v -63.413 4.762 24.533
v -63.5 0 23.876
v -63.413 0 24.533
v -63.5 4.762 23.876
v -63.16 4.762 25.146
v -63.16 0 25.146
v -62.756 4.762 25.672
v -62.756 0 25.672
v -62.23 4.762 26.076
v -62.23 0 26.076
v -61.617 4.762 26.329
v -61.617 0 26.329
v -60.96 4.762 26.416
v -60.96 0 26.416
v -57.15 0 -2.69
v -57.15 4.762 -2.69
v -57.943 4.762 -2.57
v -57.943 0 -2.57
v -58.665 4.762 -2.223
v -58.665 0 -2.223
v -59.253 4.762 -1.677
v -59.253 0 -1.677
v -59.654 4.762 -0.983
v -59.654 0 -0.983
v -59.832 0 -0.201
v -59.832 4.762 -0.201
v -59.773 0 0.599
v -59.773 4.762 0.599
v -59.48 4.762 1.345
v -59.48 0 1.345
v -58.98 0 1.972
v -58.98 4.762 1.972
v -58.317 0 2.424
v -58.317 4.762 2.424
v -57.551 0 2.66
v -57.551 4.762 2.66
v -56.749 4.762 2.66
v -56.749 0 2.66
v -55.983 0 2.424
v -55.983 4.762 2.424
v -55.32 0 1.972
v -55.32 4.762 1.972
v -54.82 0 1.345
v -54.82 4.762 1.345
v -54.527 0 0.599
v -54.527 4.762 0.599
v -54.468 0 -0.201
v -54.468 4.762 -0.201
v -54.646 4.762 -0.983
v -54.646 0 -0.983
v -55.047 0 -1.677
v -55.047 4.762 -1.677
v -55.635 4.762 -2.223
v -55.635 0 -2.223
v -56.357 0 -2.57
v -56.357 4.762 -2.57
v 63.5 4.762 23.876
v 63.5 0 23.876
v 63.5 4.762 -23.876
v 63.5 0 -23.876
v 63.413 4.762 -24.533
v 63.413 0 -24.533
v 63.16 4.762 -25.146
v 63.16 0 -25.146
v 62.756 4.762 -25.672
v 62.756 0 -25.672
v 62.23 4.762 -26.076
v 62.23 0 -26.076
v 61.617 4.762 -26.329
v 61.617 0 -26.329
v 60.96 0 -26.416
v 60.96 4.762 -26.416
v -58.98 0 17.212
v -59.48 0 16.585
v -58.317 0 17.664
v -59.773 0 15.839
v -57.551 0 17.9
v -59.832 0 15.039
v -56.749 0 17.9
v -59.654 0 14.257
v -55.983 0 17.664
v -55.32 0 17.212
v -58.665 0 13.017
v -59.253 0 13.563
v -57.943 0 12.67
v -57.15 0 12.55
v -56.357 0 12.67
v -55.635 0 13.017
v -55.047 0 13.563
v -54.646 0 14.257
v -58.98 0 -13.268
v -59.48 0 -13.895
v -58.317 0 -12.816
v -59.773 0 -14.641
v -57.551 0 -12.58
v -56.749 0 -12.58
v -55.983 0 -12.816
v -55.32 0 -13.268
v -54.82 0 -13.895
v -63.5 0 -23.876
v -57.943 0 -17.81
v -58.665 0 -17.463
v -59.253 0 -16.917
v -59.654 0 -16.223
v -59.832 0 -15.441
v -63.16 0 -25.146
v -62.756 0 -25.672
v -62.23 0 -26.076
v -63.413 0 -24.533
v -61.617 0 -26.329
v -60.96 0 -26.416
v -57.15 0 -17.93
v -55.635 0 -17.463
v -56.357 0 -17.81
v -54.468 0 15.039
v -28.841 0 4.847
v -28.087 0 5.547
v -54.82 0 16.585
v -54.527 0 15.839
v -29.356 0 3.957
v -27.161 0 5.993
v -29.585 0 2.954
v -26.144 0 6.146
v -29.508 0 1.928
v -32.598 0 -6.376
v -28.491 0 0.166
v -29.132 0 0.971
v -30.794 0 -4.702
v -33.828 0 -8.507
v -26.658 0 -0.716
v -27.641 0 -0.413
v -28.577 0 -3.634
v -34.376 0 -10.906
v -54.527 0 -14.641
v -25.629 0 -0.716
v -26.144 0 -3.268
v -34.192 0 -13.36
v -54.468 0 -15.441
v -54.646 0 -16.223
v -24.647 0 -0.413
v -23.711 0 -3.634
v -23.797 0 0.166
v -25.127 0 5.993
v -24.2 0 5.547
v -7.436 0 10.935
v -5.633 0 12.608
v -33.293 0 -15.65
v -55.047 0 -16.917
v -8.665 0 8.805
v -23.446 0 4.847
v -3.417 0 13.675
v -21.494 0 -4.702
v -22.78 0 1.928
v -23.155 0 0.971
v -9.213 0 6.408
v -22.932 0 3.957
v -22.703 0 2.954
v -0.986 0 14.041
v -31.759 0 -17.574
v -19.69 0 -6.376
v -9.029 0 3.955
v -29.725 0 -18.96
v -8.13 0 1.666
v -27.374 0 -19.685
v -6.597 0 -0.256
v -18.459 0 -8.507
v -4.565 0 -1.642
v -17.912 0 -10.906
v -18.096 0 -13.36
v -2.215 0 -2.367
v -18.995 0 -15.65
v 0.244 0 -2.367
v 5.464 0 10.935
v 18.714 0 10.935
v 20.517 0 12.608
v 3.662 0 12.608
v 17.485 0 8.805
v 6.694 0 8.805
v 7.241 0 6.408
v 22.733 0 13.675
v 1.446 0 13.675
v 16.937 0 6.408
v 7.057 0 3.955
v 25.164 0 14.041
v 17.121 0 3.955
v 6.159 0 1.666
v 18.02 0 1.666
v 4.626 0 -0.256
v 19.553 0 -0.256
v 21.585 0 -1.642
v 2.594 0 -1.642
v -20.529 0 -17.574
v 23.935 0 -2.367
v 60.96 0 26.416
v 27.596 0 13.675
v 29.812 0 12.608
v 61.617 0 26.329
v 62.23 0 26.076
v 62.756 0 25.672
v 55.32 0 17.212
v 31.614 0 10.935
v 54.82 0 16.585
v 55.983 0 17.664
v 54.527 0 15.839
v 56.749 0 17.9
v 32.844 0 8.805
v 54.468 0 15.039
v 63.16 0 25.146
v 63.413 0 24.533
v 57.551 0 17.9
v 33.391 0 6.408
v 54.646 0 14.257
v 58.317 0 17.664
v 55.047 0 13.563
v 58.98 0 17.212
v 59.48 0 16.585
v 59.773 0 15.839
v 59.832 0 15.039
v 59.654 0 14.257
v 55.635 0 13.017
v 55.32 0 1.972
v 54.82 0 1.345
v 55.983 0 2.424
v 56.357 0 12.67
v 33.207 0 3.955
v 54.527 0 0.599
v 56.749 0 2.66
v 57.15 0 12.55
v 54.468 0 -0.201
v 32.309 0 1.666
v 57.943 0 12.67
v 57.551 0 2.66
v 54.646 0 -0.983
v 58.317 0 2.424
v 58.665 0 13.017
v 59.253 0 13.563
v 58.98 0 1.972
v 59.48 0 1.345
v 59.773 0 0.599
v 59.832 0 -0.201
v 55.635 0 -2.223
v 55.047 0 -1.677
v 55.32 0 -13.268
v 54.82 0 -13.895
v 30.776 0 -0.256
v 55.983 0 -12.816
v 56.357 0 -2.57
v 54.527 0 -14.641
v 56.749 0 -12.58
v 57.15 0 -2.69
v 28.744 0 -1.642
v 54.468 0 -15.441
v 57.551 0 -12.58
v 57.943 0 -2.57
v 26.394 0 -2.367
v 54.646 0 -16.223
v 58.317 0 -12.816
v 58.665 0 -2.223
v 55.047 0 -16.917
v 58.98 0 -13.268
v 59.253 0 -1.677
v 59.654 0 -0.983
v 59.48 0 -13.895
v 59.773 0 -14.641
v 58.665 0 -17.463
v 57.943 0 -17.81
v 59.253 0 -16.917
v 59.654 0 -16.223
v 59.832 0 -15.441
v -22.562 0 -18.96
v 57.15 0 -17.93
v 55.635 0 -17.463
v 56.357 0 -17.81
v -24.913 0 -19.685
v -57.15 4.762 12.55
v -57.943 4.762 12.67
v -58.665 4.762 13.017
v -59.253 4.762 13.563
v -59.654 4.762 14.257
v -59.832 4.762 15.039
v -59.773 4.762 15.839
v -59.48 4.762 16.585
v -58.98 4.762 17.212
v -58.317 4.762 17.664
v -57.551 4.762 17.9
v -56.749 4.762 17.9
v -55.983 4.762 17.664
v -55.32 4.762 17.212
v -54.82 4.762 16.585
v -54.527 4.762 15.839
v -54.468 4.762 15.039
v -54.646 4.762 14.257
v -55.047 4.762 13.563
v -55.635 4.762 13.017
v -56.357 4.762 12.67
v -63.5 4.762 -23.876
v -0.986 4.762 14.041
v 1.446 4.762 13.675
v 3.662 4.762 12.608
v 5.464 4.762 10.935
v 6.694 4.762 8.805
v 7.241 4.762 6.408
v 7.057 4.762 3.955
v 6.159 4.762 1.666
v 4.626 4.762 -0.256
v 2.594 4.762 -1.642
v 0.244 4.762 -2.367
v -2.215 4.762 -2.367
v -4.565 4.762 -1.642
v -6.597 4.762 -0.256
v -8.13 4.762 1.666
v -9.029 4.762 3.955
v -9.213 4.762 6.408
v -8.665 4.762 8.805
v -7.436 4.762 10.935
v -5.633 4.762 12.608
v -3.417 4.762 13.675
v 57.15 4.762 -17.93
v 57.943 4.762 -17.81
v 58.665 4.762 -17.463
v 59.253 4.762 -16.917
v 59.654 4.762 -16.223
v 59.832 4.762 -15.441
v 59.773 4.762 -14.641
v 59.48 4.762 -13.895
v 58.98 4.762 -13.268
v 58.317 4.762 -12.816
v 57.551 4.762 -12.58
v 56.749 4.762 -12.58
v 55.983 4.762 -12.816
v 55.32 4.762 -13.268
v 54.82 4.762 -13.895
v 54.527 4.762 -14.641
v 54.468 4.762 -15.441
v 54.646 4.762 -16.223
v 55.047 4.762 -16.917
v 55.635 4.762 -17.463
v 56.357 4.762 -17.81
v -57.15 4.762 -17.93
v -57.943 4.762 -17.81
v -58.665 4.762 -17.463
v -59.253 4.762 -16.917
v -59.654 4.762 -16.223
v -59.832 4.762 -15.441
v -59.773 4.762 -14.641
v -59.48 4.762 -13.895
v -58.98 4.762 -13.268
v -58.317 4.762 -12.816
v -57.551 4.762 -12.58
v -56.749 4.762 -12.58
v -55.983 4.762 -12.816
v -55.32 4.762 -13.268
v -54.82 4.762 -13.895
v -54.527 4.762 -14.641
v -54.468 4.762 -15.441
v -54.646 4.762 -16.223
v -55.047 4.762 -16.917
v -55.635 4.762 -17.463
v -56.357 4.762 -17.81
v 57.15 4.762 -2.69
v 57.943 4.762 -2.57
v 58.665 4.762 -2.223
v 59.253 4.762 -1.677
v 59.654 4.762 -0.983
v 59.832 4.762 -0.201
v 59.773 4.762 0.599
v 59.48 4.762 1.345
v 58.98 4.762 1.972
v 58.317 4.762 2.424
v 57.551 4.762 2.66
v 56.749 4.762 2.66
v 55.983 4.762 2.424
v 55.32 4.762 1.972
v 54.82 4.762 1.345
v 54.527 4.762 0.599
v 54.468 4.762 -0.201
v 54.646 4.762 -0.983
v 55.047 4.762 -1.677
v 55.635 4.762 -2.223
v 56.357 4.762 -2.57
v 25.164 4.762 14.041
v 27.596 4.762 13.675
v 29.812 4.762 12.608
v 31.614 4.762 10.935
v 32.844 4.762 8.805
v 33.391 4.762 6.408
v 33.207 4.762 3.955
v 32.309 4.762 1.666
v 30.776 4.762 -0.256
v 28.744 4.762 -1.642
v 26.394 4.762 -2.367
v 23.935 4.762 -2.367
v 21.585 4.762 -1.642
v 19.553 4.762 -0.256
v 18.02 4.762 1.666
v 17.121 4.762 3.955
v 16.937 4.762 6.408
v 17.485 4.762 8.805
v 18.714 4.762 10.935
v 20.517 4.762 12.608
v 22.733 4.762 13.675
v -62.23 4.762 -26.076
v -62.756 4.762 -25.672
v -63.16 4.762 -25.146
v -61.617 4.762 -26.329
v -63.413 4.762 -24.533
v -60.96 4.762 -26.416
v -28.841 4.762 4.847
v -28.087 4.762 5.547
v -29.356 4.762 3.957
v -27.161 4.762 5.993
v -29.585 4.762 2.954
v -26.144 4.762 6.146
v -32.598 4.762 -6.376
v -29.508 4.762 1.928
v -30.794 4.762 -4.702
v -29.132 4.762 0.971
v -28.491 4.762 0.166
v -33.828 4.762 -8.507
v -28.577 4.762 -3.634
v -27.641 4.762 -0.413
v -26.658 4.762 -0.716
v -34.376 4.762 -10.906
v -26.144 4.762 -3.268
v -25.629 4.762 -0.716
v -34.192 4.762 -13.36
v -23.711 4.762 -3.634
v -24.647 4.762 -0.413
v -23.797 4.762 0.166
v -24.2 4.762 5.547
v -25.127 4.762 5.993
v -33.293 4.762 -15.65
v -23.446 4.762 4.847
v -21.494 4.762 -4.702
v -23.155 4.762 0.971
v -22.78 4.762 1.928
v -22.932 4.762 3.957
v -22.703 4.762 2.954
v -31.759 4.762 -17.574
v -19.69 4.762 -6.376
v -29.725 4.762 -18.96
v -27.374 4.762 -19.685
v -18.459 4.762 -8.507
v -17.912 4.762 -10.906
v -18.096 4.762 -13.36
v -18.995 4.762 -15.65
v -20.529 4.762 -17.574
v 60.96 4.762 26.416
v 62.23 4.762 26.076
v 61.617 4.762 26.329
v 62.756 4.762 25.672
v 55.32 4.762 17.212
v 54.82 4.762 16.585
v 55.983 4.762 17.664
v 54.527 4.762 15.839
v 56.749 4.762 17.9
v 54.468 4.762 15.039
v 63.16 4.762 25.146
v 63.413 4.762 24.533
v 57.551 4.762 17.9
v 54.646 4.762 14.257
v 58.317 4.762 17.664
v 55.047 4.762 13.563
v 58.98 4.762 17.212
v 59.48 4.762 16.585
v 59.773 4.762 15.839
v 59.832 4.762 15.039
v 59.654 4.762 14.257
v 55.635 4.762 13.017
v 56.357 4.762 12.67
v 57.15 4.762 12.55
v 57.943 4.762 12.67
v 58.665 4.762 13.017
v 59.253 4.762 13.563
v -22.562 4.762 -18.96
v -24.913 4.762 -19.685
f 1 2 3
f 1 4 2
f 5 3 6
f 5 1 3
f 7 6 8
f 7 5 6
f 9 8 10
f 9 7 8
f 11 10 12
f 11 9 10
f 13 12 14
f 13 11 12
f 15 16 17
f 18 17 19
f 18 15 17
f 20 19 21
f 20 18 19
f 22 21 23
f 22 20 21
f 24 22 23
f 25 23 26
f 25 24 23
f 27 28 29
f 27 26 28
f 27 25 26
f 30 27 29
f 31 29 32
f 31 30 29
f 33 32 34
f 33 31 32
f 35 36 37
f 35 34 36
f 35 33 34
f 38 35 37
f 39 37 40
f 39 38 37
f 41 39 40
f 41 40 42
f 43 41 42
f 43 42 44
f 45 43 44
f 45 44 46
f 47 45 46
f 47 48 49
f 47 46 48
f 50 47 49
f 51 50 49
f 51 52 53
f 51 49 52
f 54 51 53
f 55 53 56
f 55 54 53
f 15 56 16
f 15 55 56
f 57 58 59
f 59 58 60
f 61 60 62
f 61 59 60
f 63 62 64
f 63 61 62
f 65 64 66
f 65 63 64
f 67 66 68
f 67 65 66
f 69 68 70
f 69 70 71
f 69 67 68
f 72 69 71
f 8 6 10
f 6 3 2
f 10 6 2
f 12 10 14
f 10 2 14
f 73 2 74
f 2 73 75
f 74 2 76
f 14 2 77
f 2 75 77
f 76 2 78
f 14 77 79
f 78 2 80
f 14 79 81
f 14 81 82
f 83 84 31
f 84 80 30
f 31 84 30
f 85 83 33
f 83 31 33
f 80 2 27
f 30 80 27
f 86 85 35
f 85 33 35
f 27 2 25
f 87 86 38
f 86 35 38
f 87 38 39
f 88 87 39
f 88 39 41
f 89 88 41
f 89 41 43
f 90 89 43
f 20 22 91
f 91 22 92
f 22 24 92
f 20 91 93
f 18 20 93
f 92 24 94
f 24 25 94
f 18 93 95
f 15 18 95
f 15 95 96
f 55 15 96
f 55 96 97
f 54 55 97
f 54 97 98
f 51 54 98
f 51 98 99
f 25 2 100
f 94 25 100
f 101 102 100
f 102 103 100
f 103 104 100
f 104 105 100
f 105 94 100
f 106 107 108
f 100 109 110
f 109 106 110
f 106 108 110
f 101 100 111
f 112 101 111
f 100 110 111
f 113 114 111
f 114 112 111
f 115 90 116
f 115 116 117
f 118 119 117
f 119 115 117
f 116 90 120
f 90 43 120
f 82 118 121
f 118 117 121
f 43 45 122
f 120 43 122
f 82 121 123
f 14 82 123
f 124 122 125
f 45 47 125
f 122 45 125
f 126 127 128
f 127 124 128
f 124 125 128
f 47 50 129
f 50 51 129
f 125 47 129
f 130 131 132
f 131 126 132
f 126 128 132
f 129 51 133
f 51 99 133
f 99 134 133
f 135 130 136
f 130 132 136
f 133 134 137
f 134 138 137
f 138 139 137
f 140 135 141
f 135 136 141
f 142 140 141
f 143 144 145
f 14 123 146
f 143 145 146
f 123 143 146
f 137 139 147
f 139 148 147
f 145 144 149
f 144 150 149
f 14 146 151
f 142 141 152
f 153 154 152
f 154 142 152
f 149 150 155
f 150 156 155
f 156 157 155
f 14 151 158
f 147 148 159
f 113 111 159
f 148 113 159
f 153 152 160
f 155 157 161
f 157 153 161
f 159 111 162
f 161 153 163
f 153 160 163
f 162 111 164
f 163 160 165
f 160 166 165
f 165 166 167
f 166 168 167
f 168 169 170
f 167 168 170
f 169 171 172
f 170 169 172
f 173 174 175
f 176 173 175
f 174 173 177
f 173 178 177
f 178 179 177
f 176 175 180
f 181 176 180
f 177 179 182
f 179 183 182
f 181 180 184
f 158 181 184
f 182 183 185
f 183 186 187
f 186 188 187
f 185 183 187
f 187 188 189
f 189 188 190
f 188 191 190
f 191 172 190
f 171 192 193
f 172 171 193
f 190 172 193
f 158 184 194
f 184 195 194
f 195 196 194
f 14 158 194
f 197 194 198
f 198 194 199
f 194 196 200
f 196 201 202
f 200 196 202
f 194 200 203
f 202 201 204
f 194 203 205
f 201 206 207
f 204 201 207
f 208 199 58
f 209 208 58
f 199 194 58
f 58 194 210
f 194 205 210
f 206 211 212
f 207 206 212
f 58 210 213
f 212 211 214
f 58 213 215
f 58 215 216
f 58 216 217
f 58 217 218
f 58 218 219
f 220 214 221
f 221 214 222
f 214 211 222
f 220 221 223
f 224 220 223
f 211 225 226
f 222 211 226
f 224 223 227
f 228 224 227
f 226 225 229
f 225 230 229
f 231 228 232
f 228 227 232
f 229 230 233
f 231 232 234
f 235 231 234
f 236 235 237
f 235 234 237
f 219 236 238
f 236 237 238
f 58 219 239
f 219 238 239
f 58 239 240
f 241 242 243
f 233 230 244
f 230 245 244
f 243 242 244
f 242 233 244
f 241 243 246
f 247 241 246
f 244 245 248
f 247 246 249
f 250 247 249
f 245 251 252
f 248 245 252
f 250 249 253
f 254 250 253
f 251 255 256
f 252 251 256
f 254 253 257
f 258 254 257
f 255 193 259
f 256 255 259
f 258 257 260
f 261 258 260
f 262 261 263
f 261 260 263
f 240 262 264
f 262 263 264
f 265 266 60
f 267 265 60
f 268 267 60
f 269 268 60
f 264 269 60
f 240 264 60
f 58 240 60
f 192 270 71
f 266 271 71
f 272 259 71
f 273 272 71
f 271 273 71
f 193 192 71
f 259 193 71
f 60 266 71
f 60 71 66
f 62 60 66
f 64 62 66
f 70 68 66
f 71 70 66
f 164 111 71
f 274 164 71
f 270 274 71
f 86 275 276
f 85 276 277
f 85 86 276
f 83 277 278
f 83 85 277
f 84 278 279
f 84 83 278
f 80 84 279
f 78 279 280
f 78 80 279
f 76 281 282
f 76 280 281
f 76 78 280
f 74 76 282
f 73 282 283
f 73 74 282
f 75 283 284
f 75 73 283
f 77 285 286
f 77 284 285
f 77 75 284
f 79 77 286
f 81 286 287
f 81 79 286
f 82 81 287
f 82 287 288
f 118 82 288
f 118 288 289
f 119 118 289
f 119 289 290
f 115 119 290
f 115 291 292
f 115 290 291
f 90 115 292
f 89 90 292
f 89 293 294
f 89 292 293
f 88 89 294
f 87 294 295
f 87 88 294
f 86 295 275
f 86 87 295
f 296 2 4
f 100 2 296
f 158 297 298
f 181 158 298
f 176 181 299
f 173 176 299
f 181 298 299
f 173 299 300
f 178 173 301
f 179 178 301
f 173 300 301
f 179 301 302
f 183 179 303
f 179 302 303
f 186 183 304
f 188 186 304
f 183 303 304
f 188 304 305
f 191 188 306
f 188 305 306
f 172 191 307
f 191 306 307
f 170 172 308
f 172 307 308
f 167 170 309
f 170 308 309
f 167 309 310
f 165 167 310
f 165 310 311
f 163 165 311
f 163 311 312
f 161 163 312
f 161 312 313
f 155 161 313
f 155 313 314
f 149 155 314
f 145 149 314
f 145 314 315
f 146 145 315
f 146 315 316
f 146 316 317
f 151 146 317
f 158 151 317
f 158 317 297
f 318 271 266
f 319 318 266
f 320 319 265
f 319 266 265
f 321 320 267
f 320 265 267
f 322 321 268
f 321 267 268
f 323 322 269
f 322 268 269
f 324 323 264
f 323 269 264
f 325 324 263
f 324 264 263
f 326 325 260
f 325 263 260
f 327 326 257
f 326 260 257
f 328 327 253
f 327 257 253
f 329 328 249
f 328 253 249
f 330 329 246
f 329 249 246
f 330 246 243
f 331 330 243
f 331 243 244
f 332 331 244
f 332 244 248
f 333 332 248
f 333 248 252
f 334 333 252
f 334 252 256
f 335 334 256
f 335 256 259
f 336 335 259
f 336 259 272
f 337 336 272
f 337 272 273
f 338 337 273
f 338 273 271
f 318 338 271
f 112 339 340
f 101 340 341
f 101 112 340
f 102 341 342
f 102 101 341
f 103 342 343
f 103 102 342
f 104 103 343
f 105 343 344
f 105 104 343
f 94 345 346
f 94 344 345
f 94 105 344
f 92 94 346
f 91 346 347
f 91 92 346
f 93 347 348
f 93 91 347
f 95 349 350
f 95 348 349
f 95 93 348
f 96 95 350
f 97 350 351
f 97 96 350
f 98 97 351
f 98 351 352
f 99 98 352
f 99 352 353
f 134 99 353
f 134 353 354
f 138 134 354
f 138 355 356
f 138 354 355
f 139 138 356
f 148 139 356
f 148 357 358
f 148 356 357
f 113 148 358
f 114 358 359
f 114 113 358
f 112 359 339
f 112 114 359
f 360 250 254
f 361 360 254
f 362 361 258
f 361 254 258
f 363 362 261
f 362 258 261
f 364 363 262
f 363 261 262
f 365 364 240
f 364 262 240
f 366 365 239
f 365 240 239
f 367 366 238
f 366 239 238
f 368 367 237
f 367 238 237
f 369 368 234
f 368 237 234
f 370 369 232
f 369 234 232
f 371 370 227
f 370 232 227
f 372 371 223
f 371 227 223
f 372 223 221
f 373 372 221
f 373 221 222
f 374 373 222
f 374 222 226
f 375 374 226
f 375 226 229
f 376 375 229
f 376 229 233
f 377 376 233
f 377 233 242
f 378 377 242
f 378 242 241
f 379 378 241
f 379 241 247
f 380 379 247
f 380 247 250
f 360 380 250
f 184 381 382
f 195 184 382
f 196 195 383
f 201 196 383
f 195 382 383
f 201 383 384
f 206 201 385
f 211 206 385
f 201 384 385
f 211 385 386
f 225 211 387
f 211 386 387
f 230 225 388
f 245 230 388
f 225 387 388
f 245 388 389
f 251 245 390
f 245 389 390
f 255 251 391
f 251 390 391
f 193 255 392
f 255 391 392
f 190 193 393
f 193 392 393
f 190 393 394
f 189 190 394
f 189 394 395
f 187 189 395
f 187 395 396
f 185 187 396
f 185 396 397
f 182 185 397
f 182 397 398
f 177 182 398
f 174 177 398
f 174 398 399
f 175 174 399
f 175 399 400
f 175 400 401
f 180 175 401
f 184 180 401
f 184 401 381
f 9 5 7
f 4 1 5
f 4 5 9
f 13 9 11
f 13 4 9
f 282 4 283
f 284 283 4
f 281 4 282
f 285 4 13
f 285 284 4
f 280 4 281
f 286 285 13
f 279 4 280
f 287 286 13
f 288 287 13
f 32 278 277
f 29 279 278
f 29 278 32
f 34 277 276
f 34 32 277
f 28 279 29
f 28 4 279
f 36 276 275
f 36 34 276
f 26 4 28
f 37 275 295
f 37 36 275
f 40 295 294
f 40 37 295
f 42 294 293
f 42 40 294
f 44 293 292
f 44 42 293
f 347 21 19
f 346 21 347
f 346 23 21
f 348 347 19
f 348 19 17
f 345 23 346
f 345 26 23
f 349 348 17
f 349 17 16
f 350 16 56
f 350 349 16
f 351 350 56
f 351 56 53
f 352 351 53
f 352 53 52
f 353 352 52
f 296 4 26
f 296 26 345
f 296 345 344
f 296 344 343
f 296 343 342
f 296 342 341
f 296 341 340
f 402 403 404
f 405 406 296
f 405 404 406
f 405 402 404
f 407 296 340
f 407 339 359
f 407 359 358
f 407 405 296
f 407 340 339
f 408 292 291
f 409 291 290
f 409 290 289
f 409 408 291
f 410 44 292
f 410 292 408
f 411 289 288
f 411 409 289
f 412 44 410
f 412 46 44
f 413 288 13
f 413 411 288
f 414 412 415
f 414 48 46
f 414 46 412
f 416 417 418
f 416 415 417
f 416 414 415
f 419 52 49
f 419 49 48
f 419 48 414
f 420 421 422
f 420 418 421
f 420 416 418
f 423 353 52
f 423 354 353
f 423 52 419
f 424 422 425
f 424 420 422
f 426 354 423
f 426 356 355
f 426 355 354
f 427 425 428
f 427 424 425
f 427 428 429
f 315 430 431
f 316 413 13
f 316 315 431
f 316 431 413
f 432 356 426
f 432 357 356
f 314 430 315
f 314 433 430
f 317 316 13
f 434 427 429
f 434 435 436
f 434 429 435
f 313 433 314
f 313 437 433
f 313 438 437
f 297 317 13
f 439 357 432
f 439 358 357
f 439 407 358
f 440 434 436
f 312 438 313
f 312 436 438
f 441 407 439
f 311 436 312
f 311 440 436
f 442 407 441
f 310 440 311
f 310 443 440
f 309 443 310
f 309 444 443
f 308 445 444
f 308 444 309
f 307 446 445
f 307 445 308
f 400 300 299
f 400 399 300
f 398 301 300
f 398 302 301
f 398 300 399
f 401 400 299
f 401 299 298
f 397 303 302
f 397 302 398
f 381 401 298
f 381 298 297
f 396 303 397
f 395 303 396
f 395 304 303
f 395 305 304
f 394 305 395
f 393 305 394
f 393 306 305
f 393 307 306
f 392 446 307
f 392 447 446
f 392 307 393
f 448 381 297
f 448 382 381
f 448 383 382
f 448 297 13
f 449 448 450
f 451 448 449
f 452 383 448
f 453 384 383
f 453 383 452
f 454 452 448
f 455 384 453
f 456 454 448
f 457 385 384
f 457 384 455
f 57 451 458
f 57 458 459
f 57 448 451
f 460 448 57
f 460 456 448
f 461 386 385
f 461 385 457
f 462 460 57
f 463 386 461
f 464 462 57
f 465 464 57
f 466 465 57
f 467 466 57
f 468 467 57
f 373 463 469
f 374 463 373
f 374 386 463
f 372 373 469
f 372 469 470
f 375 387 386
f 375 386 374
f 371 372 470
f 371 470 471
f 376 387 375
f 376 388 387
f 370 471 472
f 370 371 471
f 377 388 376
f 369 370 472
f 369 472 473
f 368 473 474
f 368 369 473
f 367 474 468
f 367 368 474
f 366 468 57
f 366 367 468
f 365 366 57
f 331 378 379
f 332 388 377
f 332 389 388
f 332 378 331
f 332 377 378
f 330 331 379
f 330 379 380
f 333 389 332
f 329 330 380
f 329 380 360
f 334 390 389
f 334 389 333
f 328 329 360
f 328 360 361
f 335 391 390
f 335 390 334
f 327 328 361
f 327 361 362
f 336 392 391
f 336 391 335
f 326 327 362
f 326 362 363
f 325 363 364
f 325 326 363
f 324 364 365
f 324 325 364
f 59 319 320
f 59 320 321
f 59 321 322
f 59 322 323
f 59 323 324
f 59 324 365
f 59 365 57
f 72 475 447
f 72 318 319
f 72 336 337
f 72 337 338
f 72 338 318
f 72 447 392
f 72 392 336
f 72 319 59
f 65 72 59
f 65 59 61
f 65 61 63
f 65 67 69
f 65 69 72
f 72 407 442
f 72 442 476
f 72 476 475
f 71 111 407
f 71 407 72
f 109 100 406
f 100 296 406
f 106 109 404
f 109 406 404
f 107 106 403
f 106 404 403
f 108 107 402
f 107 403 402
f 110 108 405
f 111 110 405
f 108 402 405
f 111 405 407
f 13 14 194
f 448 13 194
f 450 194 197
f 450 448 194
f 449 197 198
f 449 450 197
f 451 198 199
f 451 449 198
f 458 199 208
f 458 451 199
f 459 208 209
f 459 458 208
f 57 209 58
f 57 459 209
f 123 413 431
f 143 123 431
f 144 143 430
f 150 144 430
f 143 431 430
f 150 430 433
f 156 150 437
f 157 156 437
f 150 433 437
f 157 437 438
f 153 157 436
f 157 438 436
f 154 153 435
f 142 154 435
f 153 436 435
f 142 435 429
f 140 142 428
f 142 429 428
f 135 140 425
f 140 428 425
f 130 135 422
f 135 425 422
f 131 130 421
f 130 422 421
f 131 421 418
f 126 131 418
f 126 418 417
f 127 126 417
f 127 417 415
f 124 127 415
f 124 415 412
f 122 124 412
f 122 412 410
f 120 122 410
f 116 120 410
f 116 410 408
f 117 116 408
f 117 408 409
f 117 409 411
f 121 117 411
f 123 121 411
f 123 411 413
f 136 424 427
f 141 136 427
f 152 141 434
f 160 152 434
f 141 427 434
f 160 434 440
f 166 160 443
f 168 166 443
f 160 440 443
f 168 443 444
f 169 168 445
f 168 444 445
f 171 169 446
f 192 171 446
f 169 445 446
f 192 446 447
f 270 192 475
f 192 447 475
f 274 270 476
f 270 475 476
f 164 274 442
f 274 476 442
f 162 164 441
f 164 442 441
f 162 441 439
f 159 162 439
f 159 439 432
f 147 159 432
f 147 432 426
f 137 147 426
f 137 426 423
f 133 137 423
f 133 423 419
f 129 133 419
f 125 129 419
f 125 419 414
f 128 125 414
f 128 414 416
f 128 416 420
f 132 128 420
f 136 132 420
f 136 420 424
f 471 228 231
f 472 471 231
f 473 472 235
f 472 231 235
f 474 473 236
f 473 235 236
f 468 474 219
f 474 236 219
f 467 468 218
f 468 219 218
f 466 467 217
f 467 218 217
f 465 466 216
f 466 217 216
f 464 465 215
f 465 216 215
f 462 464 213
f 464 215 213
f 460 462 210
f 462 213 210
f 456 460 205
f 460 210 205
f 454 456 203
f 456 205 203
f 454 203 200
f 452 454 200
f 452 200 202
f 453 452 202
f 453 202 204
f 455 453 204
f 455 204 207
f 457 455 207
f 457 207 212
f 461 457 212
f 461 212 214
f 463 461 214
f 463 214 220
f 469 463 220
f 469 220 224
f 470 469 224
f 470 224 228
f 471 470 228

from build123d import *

# Parameters (mm, degrees)
SKETCH1_W           = 127
SKETCH1_H           = 52.832
BOSS_EXTRUDE1_DEPTH = 4.7625
FILLET1_R           = 2.54
SKETCH2_R           = 2.69
CUT_EXTRUDE1_DEPTH  = 69.940093286
SKETCH3_R           = 8.250000011
CUT_EXTRUDE2_DEPTH  = 69.940093286
SKETCH4_R           = 8.255000001
SKETCH4_R_2         = 3.450513254
CUT_EXTRUDE3_DEPTH  = 69.940093286


with BuildPart() as part:
    # Sketch1 → Boss-Extrude1 (new body)
    with BuildSketch(Plane(origin=(0, 0, 0), x_dir=(1, 0, 0), z_dir=(0, 1, 0))):
        Rectangle(SKETCH1_W, SKETCH1_H)
    extrude(amount=BOSS_EXTRUDE1_DEPTH)

    # Fillet1
    fillet1_edges = [part.edges().sort_by_distance(p)[0] for p in [
        (63.5, 2.38125, 26.416),
        (-63.5, 2.38125, 26.416),
        (-63.5, 2.38125, -26.416),
        (63.5, 2.38125, -26.416),
    ]]
    fillet(fillet1_edges, radius=FILLET1_R)

    # Sketch2 → Cut-Extrude1 (cut, through all)
    with BuildSketch(Plane.XZ):
        with Locations(Location((57.15, -15.24, 0), (0, 0, 270))):
            Circle(SKETCH2_R)
        with Locations(Location((57.15, 0, 0), (0, 0, 270))):
            Circle(SKETCH2_R)
        with Locations(Location((57.15, 15.24, 0), (0, 0, 270))):
            Circle(SKETCH2_R)
    cut_extrude1 = extrude(amount=-CUT_EXTRUDE1_DEPTH, mode=Mode.SUBTRACT)

    # Mirror1: Cut-Extrude1 across plane
    add(cut_extrude1.mirror(Plane(origin=(0, 0, 0), x_dir=(0, 0, 1), z_dir=(1, 0, 0))), mode=Mode.SUBTRACT)

    # Sketch3 → Cut-Extrude2 (cut, through all)
    with BuildSketch(Plane(origin=(0, 4.7625, 0), x_dir=(1, 0, 0), z_dir=(0, 1, 0))):
        with Locations(Location((25.164289669, -5.7912, 0), (0, 0, 270))):
            Circle(SKETCH3_R)
        with Locations(Location((-0.985710355, -5.7912, 0), (0, 0, 270))):
            Circle(SKETCH3_R)
    extrude(amount=-CUT_EXTRUDE2_DEPTH, mode=Mode.SUBTRACT)

    # Sketch4 → Cut-Extrude3 (cut, through all)
    with BuildSketch(Plane(origin=(0, 4.7625, 0), x_dir=(1, 0, 0), z_dir=(0, 1, 0))):
        with Locations(Location((-26.143710331, 11.522643822, 0), (0, 0, 270))):
            Circle(SKETCH4_R)
        with Locations(Location((-26.143710331, -2.695896838, 0), (0, 0, 270))):
            Circle(SKETCH4_R_2)
    extrude(amount=-CUT_EXTRUDE3_DEPTH, mode=Mode.SUBTRACT)


solid = part.part
